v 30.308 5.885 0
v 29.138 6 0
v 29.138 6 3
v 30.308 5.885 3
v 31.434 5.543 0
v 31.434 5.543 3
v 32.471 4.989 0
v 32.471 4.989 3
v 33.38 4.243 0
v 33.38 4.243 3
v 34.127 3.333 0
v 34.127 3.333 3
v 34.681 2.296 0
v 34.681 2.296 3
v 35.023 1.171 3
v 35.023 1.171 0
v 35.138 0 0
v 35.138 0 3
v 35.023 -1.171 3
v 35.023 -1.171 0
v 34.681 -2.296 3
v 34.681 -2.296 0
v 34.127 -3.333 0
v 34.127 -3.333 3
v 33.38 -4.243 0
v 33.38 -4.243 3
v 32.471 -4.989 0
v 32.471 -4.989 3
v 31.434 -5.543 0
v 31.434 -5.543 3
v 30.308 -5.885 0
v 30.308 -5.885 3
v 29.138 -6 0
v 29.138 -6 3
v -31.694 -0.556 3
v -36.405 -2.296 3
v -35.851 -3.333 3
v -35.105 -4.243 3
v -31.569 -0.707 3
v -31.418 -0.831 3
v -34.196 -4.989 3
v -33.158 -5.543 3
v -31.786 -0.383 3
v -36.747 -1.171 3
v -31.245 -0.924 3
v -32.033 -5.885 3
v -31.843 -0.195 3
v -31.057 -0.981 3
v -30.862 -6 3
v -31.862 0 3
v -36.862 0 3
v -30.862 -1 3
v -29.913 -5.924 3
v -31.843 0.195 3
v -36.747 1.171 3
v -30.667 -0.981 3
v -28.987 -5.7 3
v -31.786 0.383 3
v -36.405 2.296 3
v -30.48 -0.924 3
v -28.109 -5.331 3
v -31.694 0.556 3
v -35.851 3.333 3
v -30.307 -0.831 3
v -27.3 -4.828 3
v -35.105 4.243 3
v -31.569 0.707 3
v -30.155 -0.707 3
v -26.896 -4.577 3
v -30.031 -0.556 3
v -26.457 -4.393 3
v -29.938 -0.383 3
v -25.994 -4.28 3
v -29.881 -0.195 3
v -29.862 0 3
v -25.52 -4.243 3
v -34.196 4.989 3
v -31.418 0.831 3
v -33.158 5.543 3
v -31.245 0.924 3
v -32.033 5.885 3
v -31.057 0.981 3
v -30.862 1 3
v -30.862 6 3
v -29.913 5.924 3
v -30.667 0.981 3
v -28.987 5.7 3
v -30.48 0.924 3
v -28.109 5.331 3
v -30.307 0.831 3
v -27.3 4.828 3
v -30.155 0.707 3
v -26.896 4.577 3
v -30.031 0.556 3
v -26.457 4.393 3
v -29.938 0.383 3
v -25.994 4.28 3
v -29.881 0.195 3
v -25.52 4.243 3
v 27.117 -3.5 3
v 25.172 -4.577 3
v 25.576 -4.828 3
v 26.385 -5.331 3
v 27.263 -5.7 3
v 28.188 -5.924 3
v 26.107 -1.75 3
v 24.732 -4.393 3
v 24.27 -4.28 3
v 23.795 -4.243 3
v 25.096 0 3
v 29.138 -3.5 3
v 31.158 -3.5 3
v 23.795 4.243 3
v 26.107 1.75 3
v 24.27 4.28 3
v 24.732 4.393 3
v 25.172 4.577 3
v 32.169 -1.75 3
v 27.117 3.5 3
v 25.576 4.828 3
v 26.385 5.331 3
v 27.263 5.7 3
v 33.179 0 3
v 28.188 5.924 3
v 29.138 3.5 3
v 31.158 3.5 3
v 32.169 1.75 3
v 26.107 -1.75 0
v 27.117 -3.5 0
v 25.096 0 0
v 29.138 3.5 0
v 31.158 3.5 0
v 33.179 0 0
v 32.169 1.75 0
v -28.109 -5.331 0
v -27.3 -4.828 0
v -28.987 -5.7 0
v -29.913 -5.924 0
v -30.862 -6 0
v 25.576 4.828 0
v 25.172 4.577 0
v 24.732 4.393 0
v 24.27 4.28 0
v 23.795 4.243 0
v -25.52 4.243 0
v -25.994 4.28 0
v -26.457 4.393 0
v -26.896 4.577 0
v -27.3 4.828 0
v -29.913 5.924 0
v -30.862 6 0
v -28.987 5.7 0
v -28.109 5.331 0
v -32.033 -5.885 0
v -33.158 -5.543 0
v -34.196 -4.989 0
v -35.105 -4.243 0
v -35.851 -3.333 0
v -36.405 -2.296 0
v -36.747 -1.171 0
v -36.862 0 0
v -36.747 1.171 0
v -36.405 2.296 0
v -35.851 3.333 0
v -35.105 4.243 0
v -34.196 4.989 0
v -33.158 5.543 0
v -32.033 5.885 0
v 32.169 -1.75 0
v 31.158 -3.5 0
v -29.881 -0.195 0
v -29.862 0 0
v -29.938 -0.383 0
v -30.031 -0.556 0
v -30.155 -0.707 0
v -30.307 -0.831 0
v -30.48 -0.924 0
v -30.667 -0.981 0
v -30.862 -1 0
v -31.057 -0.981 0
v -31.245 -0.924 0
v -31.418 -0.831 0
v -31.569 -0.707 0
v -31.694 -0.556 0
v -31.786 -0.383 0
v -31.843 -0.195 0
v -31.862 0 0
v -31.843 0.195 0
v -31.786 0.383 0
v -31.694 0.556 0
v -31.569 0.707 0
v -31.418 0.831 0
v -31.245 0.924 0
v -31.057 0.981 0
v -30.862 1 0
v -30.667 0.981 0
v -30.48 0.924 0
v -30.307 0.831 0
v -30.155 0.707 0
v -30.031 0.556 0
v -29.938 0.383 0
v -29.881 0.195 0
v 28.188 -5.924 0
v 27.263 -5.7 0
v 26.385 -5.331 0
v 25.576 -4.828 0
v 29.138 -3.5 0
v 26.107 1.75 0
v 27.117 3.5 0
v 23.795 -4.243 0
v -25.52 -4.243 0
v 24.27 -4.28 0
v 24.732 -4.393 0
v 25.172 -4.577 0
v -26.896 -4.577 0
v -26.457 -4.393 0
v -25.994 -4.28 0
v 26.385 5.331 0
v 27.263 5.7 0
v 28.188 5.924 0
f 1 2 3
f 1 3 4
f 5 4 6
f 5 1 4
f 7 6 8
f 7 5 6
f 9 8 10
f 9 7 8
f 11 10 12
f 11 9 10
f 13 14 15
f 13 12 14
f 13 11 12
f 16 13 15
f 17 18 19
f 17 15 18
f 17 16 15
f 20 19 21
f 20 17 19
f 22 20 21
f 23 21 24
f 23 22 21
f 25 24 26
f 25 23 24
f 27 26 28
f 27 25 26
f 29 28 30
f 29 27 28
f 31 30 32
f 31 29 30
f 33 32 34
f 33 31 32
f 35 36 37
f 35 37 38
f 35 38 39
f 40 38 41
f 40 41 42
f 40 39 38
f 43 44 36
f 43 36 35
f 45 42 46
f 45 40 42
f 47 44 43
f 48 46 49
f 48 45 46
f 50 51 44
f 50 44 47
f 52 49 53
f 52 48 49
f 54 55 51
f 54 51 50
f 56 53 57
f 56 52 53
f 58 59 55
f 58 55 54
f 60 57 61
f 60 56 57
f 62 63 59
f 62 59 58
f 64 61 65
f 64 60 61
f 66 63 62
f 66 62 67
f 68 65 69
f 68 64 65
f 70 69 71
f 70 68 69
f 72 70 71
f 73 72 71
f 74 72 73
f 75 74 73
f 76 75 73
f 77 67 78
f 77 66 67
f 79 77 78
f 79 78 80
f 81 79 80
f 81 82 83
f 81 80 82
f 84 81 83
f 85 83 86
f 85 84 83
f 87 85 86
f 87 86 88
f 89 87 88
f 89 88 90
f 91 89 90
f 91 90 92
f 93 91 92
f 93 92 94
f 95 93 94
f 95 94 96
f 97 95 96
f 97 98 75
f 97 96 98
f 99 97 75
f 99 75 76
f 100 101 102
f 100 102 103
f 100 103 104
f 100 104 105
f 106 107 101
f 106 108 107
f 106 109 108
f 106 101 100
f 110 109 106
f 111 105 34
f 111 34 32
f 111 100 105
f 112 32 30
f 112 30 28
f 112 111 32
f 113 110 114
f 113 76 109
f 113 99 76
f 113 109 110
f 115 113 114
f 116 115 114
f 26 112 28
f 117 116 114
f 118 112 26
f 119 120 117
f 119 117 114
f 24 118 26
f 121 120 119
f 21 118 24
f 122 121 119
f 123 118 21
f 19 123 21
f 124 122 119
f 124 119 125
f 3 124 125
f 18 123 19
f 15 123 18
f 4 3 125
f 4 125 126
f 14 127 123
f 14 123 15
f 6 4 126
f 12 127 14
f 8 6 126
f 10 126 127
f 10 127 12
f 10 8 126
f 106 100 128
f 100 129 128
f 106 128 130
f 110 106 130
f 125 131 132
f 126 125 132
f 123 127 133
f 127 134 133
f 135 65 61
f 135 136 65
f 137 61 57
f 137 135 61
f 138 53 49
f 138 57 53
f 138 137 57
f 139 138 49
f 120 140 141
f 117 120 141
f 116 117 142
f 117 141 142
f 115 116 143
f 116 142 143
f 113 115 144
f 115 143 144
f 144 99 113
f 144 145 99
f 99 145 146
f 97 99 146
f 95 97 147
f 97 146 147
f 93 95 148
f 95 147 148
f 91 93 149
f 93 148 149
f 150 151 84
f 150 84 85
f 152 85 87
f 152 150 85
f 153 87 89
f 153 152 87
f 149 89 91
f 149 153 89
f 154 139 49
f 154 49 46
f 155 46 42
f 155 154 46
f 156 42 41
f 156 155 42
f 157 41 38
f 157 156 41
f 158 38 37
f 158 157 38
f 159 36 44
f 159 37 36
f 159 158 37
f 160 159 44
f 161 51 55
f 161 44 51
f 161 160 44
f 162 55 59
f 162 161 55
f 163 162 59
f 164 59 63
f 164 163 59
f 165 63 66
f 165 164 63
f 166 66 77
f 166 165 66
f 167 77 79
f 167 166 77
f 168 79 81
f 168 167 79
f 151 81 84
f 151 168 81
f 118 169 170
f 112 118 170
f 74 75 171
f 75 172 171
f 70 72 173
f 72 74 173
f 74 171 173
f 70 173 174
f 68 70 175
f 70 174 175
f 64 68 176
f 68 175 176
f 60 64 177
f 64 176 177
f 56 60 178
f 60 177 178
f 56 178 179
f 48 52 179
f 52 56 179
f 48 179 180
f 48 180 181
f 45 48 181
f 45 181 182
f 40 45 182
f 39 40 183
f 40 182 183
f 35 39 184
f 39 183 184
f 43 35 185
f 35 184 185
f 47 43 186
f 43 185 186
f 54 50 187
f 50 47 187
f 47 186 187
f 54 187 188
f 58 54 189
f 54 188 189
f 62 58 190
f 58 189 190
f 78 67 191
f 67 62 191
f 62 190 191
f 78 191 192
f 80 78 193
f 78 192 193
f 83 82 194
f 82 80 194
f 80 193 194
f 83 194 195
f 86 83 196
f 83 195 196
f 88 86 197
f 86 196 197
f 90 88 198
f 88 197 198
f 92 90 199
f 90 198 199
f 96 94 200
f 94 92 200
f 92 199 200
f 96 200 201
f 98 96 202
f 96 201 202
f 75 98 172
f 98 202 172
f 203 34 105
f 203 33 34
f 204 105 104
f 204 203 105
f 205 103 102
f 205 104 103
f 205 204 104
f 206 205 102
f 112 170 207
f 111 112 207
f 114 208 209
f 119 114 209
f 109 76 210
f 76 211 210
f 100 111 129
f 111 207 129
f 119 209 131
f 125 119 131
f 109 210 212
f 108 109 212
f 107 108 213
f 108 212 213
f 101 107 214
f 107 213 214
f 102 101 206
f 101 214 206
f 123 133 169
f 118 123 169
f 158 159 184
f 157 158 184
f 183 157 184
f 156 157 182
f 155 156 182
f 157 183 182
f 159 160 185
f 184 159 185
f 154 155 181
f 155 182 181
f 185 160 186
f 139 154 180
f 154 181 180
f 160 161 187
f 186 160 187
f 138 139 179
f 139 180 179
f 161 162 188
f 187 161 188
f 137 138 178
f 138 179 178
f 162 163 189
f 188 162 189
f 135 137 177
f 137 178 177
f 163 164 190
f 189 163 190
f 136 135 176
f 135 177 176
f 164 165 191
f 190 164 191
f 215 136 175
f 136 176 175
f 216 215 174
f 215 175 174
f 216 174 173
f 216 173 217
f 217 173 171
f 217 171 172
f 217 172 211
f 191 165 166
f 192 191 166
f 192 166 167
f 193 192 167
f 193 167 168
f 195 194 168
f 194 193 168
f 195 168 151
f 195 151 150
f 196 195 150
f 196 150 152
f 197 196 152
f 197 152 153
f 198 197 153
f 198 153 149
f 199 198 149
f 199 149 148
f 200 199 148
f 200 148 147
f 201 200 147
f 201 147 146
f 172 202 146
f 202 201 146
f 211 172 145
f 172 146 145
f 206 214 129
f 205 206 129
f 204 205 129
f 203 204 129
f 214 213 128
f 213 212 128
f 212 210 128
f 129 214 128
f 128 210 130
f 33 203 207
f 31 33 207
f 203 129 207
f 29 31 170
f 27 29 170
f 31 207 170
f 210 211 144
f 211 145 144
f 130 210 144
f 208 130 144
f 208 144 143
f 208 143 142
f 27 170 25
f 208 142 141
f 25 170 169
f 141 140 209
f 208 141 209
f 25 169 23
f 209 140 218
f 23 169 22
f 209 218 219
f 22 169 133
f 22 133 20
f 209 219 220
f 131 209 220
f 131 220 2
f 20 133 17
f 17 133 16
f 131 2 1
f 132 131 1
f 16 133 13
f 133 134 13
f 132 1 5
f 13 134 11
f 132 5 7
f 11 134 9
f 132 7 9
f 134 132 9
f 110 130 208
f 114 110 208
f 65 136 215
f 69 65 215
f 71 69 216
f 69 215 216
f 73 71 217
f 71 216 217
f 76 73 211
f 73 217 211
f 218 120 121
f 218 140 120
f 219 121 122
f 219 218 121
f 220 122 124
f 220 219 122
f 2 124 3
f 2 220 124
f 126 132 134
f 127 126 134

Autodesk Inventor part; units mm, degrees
ref_plane "YZ Plane" through (0, 0, 0) normal (1, 0, 0) x (0, 1, 0)
ref_plane "XZ Plane" through (0, 0, 0) normal (0, 1, 0) x (-1, 0, 0)
ref_plane "XY Plane" through (0, 0, 0) normal (0, 0, 1) x (1, 0, 0)
sketch "Sketch1" plane through (0, 0, 0) normal (0, 0, 1) x (1, 0, 0)
  circle A0 centre (29.1378, 0) radius 3.5
  arc A1 (-30.8622, 6) -> (-30.8622, -6) centre (-30.8622, 0) ccw
  arc A2 (29.1378, -6) -> (29.1378, 6) centre (29.1378, 0) ccw
  arc A3 (-30.8622, -6) -> (-27.3004, -4.8284) centre (-30.8622, 0) ccw
  line L0 (-30.8622, 0) -> (-26.6195, -4.2426) construction
  line L1 (-30.8622, 0) -> (-30.8622, -6) construction
  arc A4 (-27.3004, 4.8284) -> (-30.8622, 6) centre (-30.8622, 0) ccw
  line L2 (-30.8622, 0) -> (-26.6195, 4.2426) construction
  line L3 (-30.8622, 0) -> (-30.8622, 6) construction
  arc A5 (29.1378, 6) -> (25.576, 4.8284) centre (29.1378, 0) ccw
  line L4 (29.1378, 0) -> (24.8952, 4.2426) construction
  line L5 (29.1378, 0) -> (29.1378, 6) construction
  arc A6 (25.576, -4.8284) -> (29.1378, -6) centre (29.1378, 0) ccw
  line L6 (29.1378, 0) -> (24.8952, -4.2426) construction
  line L7 (29.1378, 0) -> (29.1378, -6) construction
  line L8 (-25.5195, 4.2426) -> (23.7951, 4.2426)
  line L9 (-25.5195, -4.2426) -> (23.7951, -4.2426)
  arc A7 (-27.3004, 4.8284) -> (-25.5195, 4.2426) centre (-25.5195, 7.2426) ccw
  arc A8 (-25.5195, -4.2426) -> (-27.3004, -4.8284) centre (-25.5195, -7.2426) ccw
  arc A9 (23.7951, 4.2426) -> (25.576, 4.8284) centre (23.7951, 7.2426) ccw
  arc A10 (25.576, -4.8284) -> (23.7951, -4.2426) centre (23.7951, -7.2426) ccw
  line L10 (33.1793, 0) -> (31.1585, -3.5)
  line L11 (31.1585, -3.5) -> (27.1171, -3.5)
  line L12 (27.1171, -3.5) -> (25.0964, 0)
  line L13 (25.0964, 0) -> (27.1171, 3.5)
  line L14 (27.1171, 3.5) -> (31.1585, 3.5)
  line L15 (31.1585, 3.5) -> (33.1793, 0)
  circle A11 centre (-30.8622, 0) radius 1
  point P0 (0, 0)
  point P1 (24.8952, 4.2426)
  dimension "d1" = 7
  dimension "d2" = 60
  dimension "d3" = 6
  dimension "d4" = 6
  dimension "d5" = 45
  dimension "d6" = 45
  dimension "d7" = 45
  dimension "d8" = 45
  dimension "d9" = 3
  dimension "d17" = 2
extrude "Extrusion2" add sketch "Sketch1" along normal blind 3
properties part number "2P.03.01.18.ZW.AileronCrank"
